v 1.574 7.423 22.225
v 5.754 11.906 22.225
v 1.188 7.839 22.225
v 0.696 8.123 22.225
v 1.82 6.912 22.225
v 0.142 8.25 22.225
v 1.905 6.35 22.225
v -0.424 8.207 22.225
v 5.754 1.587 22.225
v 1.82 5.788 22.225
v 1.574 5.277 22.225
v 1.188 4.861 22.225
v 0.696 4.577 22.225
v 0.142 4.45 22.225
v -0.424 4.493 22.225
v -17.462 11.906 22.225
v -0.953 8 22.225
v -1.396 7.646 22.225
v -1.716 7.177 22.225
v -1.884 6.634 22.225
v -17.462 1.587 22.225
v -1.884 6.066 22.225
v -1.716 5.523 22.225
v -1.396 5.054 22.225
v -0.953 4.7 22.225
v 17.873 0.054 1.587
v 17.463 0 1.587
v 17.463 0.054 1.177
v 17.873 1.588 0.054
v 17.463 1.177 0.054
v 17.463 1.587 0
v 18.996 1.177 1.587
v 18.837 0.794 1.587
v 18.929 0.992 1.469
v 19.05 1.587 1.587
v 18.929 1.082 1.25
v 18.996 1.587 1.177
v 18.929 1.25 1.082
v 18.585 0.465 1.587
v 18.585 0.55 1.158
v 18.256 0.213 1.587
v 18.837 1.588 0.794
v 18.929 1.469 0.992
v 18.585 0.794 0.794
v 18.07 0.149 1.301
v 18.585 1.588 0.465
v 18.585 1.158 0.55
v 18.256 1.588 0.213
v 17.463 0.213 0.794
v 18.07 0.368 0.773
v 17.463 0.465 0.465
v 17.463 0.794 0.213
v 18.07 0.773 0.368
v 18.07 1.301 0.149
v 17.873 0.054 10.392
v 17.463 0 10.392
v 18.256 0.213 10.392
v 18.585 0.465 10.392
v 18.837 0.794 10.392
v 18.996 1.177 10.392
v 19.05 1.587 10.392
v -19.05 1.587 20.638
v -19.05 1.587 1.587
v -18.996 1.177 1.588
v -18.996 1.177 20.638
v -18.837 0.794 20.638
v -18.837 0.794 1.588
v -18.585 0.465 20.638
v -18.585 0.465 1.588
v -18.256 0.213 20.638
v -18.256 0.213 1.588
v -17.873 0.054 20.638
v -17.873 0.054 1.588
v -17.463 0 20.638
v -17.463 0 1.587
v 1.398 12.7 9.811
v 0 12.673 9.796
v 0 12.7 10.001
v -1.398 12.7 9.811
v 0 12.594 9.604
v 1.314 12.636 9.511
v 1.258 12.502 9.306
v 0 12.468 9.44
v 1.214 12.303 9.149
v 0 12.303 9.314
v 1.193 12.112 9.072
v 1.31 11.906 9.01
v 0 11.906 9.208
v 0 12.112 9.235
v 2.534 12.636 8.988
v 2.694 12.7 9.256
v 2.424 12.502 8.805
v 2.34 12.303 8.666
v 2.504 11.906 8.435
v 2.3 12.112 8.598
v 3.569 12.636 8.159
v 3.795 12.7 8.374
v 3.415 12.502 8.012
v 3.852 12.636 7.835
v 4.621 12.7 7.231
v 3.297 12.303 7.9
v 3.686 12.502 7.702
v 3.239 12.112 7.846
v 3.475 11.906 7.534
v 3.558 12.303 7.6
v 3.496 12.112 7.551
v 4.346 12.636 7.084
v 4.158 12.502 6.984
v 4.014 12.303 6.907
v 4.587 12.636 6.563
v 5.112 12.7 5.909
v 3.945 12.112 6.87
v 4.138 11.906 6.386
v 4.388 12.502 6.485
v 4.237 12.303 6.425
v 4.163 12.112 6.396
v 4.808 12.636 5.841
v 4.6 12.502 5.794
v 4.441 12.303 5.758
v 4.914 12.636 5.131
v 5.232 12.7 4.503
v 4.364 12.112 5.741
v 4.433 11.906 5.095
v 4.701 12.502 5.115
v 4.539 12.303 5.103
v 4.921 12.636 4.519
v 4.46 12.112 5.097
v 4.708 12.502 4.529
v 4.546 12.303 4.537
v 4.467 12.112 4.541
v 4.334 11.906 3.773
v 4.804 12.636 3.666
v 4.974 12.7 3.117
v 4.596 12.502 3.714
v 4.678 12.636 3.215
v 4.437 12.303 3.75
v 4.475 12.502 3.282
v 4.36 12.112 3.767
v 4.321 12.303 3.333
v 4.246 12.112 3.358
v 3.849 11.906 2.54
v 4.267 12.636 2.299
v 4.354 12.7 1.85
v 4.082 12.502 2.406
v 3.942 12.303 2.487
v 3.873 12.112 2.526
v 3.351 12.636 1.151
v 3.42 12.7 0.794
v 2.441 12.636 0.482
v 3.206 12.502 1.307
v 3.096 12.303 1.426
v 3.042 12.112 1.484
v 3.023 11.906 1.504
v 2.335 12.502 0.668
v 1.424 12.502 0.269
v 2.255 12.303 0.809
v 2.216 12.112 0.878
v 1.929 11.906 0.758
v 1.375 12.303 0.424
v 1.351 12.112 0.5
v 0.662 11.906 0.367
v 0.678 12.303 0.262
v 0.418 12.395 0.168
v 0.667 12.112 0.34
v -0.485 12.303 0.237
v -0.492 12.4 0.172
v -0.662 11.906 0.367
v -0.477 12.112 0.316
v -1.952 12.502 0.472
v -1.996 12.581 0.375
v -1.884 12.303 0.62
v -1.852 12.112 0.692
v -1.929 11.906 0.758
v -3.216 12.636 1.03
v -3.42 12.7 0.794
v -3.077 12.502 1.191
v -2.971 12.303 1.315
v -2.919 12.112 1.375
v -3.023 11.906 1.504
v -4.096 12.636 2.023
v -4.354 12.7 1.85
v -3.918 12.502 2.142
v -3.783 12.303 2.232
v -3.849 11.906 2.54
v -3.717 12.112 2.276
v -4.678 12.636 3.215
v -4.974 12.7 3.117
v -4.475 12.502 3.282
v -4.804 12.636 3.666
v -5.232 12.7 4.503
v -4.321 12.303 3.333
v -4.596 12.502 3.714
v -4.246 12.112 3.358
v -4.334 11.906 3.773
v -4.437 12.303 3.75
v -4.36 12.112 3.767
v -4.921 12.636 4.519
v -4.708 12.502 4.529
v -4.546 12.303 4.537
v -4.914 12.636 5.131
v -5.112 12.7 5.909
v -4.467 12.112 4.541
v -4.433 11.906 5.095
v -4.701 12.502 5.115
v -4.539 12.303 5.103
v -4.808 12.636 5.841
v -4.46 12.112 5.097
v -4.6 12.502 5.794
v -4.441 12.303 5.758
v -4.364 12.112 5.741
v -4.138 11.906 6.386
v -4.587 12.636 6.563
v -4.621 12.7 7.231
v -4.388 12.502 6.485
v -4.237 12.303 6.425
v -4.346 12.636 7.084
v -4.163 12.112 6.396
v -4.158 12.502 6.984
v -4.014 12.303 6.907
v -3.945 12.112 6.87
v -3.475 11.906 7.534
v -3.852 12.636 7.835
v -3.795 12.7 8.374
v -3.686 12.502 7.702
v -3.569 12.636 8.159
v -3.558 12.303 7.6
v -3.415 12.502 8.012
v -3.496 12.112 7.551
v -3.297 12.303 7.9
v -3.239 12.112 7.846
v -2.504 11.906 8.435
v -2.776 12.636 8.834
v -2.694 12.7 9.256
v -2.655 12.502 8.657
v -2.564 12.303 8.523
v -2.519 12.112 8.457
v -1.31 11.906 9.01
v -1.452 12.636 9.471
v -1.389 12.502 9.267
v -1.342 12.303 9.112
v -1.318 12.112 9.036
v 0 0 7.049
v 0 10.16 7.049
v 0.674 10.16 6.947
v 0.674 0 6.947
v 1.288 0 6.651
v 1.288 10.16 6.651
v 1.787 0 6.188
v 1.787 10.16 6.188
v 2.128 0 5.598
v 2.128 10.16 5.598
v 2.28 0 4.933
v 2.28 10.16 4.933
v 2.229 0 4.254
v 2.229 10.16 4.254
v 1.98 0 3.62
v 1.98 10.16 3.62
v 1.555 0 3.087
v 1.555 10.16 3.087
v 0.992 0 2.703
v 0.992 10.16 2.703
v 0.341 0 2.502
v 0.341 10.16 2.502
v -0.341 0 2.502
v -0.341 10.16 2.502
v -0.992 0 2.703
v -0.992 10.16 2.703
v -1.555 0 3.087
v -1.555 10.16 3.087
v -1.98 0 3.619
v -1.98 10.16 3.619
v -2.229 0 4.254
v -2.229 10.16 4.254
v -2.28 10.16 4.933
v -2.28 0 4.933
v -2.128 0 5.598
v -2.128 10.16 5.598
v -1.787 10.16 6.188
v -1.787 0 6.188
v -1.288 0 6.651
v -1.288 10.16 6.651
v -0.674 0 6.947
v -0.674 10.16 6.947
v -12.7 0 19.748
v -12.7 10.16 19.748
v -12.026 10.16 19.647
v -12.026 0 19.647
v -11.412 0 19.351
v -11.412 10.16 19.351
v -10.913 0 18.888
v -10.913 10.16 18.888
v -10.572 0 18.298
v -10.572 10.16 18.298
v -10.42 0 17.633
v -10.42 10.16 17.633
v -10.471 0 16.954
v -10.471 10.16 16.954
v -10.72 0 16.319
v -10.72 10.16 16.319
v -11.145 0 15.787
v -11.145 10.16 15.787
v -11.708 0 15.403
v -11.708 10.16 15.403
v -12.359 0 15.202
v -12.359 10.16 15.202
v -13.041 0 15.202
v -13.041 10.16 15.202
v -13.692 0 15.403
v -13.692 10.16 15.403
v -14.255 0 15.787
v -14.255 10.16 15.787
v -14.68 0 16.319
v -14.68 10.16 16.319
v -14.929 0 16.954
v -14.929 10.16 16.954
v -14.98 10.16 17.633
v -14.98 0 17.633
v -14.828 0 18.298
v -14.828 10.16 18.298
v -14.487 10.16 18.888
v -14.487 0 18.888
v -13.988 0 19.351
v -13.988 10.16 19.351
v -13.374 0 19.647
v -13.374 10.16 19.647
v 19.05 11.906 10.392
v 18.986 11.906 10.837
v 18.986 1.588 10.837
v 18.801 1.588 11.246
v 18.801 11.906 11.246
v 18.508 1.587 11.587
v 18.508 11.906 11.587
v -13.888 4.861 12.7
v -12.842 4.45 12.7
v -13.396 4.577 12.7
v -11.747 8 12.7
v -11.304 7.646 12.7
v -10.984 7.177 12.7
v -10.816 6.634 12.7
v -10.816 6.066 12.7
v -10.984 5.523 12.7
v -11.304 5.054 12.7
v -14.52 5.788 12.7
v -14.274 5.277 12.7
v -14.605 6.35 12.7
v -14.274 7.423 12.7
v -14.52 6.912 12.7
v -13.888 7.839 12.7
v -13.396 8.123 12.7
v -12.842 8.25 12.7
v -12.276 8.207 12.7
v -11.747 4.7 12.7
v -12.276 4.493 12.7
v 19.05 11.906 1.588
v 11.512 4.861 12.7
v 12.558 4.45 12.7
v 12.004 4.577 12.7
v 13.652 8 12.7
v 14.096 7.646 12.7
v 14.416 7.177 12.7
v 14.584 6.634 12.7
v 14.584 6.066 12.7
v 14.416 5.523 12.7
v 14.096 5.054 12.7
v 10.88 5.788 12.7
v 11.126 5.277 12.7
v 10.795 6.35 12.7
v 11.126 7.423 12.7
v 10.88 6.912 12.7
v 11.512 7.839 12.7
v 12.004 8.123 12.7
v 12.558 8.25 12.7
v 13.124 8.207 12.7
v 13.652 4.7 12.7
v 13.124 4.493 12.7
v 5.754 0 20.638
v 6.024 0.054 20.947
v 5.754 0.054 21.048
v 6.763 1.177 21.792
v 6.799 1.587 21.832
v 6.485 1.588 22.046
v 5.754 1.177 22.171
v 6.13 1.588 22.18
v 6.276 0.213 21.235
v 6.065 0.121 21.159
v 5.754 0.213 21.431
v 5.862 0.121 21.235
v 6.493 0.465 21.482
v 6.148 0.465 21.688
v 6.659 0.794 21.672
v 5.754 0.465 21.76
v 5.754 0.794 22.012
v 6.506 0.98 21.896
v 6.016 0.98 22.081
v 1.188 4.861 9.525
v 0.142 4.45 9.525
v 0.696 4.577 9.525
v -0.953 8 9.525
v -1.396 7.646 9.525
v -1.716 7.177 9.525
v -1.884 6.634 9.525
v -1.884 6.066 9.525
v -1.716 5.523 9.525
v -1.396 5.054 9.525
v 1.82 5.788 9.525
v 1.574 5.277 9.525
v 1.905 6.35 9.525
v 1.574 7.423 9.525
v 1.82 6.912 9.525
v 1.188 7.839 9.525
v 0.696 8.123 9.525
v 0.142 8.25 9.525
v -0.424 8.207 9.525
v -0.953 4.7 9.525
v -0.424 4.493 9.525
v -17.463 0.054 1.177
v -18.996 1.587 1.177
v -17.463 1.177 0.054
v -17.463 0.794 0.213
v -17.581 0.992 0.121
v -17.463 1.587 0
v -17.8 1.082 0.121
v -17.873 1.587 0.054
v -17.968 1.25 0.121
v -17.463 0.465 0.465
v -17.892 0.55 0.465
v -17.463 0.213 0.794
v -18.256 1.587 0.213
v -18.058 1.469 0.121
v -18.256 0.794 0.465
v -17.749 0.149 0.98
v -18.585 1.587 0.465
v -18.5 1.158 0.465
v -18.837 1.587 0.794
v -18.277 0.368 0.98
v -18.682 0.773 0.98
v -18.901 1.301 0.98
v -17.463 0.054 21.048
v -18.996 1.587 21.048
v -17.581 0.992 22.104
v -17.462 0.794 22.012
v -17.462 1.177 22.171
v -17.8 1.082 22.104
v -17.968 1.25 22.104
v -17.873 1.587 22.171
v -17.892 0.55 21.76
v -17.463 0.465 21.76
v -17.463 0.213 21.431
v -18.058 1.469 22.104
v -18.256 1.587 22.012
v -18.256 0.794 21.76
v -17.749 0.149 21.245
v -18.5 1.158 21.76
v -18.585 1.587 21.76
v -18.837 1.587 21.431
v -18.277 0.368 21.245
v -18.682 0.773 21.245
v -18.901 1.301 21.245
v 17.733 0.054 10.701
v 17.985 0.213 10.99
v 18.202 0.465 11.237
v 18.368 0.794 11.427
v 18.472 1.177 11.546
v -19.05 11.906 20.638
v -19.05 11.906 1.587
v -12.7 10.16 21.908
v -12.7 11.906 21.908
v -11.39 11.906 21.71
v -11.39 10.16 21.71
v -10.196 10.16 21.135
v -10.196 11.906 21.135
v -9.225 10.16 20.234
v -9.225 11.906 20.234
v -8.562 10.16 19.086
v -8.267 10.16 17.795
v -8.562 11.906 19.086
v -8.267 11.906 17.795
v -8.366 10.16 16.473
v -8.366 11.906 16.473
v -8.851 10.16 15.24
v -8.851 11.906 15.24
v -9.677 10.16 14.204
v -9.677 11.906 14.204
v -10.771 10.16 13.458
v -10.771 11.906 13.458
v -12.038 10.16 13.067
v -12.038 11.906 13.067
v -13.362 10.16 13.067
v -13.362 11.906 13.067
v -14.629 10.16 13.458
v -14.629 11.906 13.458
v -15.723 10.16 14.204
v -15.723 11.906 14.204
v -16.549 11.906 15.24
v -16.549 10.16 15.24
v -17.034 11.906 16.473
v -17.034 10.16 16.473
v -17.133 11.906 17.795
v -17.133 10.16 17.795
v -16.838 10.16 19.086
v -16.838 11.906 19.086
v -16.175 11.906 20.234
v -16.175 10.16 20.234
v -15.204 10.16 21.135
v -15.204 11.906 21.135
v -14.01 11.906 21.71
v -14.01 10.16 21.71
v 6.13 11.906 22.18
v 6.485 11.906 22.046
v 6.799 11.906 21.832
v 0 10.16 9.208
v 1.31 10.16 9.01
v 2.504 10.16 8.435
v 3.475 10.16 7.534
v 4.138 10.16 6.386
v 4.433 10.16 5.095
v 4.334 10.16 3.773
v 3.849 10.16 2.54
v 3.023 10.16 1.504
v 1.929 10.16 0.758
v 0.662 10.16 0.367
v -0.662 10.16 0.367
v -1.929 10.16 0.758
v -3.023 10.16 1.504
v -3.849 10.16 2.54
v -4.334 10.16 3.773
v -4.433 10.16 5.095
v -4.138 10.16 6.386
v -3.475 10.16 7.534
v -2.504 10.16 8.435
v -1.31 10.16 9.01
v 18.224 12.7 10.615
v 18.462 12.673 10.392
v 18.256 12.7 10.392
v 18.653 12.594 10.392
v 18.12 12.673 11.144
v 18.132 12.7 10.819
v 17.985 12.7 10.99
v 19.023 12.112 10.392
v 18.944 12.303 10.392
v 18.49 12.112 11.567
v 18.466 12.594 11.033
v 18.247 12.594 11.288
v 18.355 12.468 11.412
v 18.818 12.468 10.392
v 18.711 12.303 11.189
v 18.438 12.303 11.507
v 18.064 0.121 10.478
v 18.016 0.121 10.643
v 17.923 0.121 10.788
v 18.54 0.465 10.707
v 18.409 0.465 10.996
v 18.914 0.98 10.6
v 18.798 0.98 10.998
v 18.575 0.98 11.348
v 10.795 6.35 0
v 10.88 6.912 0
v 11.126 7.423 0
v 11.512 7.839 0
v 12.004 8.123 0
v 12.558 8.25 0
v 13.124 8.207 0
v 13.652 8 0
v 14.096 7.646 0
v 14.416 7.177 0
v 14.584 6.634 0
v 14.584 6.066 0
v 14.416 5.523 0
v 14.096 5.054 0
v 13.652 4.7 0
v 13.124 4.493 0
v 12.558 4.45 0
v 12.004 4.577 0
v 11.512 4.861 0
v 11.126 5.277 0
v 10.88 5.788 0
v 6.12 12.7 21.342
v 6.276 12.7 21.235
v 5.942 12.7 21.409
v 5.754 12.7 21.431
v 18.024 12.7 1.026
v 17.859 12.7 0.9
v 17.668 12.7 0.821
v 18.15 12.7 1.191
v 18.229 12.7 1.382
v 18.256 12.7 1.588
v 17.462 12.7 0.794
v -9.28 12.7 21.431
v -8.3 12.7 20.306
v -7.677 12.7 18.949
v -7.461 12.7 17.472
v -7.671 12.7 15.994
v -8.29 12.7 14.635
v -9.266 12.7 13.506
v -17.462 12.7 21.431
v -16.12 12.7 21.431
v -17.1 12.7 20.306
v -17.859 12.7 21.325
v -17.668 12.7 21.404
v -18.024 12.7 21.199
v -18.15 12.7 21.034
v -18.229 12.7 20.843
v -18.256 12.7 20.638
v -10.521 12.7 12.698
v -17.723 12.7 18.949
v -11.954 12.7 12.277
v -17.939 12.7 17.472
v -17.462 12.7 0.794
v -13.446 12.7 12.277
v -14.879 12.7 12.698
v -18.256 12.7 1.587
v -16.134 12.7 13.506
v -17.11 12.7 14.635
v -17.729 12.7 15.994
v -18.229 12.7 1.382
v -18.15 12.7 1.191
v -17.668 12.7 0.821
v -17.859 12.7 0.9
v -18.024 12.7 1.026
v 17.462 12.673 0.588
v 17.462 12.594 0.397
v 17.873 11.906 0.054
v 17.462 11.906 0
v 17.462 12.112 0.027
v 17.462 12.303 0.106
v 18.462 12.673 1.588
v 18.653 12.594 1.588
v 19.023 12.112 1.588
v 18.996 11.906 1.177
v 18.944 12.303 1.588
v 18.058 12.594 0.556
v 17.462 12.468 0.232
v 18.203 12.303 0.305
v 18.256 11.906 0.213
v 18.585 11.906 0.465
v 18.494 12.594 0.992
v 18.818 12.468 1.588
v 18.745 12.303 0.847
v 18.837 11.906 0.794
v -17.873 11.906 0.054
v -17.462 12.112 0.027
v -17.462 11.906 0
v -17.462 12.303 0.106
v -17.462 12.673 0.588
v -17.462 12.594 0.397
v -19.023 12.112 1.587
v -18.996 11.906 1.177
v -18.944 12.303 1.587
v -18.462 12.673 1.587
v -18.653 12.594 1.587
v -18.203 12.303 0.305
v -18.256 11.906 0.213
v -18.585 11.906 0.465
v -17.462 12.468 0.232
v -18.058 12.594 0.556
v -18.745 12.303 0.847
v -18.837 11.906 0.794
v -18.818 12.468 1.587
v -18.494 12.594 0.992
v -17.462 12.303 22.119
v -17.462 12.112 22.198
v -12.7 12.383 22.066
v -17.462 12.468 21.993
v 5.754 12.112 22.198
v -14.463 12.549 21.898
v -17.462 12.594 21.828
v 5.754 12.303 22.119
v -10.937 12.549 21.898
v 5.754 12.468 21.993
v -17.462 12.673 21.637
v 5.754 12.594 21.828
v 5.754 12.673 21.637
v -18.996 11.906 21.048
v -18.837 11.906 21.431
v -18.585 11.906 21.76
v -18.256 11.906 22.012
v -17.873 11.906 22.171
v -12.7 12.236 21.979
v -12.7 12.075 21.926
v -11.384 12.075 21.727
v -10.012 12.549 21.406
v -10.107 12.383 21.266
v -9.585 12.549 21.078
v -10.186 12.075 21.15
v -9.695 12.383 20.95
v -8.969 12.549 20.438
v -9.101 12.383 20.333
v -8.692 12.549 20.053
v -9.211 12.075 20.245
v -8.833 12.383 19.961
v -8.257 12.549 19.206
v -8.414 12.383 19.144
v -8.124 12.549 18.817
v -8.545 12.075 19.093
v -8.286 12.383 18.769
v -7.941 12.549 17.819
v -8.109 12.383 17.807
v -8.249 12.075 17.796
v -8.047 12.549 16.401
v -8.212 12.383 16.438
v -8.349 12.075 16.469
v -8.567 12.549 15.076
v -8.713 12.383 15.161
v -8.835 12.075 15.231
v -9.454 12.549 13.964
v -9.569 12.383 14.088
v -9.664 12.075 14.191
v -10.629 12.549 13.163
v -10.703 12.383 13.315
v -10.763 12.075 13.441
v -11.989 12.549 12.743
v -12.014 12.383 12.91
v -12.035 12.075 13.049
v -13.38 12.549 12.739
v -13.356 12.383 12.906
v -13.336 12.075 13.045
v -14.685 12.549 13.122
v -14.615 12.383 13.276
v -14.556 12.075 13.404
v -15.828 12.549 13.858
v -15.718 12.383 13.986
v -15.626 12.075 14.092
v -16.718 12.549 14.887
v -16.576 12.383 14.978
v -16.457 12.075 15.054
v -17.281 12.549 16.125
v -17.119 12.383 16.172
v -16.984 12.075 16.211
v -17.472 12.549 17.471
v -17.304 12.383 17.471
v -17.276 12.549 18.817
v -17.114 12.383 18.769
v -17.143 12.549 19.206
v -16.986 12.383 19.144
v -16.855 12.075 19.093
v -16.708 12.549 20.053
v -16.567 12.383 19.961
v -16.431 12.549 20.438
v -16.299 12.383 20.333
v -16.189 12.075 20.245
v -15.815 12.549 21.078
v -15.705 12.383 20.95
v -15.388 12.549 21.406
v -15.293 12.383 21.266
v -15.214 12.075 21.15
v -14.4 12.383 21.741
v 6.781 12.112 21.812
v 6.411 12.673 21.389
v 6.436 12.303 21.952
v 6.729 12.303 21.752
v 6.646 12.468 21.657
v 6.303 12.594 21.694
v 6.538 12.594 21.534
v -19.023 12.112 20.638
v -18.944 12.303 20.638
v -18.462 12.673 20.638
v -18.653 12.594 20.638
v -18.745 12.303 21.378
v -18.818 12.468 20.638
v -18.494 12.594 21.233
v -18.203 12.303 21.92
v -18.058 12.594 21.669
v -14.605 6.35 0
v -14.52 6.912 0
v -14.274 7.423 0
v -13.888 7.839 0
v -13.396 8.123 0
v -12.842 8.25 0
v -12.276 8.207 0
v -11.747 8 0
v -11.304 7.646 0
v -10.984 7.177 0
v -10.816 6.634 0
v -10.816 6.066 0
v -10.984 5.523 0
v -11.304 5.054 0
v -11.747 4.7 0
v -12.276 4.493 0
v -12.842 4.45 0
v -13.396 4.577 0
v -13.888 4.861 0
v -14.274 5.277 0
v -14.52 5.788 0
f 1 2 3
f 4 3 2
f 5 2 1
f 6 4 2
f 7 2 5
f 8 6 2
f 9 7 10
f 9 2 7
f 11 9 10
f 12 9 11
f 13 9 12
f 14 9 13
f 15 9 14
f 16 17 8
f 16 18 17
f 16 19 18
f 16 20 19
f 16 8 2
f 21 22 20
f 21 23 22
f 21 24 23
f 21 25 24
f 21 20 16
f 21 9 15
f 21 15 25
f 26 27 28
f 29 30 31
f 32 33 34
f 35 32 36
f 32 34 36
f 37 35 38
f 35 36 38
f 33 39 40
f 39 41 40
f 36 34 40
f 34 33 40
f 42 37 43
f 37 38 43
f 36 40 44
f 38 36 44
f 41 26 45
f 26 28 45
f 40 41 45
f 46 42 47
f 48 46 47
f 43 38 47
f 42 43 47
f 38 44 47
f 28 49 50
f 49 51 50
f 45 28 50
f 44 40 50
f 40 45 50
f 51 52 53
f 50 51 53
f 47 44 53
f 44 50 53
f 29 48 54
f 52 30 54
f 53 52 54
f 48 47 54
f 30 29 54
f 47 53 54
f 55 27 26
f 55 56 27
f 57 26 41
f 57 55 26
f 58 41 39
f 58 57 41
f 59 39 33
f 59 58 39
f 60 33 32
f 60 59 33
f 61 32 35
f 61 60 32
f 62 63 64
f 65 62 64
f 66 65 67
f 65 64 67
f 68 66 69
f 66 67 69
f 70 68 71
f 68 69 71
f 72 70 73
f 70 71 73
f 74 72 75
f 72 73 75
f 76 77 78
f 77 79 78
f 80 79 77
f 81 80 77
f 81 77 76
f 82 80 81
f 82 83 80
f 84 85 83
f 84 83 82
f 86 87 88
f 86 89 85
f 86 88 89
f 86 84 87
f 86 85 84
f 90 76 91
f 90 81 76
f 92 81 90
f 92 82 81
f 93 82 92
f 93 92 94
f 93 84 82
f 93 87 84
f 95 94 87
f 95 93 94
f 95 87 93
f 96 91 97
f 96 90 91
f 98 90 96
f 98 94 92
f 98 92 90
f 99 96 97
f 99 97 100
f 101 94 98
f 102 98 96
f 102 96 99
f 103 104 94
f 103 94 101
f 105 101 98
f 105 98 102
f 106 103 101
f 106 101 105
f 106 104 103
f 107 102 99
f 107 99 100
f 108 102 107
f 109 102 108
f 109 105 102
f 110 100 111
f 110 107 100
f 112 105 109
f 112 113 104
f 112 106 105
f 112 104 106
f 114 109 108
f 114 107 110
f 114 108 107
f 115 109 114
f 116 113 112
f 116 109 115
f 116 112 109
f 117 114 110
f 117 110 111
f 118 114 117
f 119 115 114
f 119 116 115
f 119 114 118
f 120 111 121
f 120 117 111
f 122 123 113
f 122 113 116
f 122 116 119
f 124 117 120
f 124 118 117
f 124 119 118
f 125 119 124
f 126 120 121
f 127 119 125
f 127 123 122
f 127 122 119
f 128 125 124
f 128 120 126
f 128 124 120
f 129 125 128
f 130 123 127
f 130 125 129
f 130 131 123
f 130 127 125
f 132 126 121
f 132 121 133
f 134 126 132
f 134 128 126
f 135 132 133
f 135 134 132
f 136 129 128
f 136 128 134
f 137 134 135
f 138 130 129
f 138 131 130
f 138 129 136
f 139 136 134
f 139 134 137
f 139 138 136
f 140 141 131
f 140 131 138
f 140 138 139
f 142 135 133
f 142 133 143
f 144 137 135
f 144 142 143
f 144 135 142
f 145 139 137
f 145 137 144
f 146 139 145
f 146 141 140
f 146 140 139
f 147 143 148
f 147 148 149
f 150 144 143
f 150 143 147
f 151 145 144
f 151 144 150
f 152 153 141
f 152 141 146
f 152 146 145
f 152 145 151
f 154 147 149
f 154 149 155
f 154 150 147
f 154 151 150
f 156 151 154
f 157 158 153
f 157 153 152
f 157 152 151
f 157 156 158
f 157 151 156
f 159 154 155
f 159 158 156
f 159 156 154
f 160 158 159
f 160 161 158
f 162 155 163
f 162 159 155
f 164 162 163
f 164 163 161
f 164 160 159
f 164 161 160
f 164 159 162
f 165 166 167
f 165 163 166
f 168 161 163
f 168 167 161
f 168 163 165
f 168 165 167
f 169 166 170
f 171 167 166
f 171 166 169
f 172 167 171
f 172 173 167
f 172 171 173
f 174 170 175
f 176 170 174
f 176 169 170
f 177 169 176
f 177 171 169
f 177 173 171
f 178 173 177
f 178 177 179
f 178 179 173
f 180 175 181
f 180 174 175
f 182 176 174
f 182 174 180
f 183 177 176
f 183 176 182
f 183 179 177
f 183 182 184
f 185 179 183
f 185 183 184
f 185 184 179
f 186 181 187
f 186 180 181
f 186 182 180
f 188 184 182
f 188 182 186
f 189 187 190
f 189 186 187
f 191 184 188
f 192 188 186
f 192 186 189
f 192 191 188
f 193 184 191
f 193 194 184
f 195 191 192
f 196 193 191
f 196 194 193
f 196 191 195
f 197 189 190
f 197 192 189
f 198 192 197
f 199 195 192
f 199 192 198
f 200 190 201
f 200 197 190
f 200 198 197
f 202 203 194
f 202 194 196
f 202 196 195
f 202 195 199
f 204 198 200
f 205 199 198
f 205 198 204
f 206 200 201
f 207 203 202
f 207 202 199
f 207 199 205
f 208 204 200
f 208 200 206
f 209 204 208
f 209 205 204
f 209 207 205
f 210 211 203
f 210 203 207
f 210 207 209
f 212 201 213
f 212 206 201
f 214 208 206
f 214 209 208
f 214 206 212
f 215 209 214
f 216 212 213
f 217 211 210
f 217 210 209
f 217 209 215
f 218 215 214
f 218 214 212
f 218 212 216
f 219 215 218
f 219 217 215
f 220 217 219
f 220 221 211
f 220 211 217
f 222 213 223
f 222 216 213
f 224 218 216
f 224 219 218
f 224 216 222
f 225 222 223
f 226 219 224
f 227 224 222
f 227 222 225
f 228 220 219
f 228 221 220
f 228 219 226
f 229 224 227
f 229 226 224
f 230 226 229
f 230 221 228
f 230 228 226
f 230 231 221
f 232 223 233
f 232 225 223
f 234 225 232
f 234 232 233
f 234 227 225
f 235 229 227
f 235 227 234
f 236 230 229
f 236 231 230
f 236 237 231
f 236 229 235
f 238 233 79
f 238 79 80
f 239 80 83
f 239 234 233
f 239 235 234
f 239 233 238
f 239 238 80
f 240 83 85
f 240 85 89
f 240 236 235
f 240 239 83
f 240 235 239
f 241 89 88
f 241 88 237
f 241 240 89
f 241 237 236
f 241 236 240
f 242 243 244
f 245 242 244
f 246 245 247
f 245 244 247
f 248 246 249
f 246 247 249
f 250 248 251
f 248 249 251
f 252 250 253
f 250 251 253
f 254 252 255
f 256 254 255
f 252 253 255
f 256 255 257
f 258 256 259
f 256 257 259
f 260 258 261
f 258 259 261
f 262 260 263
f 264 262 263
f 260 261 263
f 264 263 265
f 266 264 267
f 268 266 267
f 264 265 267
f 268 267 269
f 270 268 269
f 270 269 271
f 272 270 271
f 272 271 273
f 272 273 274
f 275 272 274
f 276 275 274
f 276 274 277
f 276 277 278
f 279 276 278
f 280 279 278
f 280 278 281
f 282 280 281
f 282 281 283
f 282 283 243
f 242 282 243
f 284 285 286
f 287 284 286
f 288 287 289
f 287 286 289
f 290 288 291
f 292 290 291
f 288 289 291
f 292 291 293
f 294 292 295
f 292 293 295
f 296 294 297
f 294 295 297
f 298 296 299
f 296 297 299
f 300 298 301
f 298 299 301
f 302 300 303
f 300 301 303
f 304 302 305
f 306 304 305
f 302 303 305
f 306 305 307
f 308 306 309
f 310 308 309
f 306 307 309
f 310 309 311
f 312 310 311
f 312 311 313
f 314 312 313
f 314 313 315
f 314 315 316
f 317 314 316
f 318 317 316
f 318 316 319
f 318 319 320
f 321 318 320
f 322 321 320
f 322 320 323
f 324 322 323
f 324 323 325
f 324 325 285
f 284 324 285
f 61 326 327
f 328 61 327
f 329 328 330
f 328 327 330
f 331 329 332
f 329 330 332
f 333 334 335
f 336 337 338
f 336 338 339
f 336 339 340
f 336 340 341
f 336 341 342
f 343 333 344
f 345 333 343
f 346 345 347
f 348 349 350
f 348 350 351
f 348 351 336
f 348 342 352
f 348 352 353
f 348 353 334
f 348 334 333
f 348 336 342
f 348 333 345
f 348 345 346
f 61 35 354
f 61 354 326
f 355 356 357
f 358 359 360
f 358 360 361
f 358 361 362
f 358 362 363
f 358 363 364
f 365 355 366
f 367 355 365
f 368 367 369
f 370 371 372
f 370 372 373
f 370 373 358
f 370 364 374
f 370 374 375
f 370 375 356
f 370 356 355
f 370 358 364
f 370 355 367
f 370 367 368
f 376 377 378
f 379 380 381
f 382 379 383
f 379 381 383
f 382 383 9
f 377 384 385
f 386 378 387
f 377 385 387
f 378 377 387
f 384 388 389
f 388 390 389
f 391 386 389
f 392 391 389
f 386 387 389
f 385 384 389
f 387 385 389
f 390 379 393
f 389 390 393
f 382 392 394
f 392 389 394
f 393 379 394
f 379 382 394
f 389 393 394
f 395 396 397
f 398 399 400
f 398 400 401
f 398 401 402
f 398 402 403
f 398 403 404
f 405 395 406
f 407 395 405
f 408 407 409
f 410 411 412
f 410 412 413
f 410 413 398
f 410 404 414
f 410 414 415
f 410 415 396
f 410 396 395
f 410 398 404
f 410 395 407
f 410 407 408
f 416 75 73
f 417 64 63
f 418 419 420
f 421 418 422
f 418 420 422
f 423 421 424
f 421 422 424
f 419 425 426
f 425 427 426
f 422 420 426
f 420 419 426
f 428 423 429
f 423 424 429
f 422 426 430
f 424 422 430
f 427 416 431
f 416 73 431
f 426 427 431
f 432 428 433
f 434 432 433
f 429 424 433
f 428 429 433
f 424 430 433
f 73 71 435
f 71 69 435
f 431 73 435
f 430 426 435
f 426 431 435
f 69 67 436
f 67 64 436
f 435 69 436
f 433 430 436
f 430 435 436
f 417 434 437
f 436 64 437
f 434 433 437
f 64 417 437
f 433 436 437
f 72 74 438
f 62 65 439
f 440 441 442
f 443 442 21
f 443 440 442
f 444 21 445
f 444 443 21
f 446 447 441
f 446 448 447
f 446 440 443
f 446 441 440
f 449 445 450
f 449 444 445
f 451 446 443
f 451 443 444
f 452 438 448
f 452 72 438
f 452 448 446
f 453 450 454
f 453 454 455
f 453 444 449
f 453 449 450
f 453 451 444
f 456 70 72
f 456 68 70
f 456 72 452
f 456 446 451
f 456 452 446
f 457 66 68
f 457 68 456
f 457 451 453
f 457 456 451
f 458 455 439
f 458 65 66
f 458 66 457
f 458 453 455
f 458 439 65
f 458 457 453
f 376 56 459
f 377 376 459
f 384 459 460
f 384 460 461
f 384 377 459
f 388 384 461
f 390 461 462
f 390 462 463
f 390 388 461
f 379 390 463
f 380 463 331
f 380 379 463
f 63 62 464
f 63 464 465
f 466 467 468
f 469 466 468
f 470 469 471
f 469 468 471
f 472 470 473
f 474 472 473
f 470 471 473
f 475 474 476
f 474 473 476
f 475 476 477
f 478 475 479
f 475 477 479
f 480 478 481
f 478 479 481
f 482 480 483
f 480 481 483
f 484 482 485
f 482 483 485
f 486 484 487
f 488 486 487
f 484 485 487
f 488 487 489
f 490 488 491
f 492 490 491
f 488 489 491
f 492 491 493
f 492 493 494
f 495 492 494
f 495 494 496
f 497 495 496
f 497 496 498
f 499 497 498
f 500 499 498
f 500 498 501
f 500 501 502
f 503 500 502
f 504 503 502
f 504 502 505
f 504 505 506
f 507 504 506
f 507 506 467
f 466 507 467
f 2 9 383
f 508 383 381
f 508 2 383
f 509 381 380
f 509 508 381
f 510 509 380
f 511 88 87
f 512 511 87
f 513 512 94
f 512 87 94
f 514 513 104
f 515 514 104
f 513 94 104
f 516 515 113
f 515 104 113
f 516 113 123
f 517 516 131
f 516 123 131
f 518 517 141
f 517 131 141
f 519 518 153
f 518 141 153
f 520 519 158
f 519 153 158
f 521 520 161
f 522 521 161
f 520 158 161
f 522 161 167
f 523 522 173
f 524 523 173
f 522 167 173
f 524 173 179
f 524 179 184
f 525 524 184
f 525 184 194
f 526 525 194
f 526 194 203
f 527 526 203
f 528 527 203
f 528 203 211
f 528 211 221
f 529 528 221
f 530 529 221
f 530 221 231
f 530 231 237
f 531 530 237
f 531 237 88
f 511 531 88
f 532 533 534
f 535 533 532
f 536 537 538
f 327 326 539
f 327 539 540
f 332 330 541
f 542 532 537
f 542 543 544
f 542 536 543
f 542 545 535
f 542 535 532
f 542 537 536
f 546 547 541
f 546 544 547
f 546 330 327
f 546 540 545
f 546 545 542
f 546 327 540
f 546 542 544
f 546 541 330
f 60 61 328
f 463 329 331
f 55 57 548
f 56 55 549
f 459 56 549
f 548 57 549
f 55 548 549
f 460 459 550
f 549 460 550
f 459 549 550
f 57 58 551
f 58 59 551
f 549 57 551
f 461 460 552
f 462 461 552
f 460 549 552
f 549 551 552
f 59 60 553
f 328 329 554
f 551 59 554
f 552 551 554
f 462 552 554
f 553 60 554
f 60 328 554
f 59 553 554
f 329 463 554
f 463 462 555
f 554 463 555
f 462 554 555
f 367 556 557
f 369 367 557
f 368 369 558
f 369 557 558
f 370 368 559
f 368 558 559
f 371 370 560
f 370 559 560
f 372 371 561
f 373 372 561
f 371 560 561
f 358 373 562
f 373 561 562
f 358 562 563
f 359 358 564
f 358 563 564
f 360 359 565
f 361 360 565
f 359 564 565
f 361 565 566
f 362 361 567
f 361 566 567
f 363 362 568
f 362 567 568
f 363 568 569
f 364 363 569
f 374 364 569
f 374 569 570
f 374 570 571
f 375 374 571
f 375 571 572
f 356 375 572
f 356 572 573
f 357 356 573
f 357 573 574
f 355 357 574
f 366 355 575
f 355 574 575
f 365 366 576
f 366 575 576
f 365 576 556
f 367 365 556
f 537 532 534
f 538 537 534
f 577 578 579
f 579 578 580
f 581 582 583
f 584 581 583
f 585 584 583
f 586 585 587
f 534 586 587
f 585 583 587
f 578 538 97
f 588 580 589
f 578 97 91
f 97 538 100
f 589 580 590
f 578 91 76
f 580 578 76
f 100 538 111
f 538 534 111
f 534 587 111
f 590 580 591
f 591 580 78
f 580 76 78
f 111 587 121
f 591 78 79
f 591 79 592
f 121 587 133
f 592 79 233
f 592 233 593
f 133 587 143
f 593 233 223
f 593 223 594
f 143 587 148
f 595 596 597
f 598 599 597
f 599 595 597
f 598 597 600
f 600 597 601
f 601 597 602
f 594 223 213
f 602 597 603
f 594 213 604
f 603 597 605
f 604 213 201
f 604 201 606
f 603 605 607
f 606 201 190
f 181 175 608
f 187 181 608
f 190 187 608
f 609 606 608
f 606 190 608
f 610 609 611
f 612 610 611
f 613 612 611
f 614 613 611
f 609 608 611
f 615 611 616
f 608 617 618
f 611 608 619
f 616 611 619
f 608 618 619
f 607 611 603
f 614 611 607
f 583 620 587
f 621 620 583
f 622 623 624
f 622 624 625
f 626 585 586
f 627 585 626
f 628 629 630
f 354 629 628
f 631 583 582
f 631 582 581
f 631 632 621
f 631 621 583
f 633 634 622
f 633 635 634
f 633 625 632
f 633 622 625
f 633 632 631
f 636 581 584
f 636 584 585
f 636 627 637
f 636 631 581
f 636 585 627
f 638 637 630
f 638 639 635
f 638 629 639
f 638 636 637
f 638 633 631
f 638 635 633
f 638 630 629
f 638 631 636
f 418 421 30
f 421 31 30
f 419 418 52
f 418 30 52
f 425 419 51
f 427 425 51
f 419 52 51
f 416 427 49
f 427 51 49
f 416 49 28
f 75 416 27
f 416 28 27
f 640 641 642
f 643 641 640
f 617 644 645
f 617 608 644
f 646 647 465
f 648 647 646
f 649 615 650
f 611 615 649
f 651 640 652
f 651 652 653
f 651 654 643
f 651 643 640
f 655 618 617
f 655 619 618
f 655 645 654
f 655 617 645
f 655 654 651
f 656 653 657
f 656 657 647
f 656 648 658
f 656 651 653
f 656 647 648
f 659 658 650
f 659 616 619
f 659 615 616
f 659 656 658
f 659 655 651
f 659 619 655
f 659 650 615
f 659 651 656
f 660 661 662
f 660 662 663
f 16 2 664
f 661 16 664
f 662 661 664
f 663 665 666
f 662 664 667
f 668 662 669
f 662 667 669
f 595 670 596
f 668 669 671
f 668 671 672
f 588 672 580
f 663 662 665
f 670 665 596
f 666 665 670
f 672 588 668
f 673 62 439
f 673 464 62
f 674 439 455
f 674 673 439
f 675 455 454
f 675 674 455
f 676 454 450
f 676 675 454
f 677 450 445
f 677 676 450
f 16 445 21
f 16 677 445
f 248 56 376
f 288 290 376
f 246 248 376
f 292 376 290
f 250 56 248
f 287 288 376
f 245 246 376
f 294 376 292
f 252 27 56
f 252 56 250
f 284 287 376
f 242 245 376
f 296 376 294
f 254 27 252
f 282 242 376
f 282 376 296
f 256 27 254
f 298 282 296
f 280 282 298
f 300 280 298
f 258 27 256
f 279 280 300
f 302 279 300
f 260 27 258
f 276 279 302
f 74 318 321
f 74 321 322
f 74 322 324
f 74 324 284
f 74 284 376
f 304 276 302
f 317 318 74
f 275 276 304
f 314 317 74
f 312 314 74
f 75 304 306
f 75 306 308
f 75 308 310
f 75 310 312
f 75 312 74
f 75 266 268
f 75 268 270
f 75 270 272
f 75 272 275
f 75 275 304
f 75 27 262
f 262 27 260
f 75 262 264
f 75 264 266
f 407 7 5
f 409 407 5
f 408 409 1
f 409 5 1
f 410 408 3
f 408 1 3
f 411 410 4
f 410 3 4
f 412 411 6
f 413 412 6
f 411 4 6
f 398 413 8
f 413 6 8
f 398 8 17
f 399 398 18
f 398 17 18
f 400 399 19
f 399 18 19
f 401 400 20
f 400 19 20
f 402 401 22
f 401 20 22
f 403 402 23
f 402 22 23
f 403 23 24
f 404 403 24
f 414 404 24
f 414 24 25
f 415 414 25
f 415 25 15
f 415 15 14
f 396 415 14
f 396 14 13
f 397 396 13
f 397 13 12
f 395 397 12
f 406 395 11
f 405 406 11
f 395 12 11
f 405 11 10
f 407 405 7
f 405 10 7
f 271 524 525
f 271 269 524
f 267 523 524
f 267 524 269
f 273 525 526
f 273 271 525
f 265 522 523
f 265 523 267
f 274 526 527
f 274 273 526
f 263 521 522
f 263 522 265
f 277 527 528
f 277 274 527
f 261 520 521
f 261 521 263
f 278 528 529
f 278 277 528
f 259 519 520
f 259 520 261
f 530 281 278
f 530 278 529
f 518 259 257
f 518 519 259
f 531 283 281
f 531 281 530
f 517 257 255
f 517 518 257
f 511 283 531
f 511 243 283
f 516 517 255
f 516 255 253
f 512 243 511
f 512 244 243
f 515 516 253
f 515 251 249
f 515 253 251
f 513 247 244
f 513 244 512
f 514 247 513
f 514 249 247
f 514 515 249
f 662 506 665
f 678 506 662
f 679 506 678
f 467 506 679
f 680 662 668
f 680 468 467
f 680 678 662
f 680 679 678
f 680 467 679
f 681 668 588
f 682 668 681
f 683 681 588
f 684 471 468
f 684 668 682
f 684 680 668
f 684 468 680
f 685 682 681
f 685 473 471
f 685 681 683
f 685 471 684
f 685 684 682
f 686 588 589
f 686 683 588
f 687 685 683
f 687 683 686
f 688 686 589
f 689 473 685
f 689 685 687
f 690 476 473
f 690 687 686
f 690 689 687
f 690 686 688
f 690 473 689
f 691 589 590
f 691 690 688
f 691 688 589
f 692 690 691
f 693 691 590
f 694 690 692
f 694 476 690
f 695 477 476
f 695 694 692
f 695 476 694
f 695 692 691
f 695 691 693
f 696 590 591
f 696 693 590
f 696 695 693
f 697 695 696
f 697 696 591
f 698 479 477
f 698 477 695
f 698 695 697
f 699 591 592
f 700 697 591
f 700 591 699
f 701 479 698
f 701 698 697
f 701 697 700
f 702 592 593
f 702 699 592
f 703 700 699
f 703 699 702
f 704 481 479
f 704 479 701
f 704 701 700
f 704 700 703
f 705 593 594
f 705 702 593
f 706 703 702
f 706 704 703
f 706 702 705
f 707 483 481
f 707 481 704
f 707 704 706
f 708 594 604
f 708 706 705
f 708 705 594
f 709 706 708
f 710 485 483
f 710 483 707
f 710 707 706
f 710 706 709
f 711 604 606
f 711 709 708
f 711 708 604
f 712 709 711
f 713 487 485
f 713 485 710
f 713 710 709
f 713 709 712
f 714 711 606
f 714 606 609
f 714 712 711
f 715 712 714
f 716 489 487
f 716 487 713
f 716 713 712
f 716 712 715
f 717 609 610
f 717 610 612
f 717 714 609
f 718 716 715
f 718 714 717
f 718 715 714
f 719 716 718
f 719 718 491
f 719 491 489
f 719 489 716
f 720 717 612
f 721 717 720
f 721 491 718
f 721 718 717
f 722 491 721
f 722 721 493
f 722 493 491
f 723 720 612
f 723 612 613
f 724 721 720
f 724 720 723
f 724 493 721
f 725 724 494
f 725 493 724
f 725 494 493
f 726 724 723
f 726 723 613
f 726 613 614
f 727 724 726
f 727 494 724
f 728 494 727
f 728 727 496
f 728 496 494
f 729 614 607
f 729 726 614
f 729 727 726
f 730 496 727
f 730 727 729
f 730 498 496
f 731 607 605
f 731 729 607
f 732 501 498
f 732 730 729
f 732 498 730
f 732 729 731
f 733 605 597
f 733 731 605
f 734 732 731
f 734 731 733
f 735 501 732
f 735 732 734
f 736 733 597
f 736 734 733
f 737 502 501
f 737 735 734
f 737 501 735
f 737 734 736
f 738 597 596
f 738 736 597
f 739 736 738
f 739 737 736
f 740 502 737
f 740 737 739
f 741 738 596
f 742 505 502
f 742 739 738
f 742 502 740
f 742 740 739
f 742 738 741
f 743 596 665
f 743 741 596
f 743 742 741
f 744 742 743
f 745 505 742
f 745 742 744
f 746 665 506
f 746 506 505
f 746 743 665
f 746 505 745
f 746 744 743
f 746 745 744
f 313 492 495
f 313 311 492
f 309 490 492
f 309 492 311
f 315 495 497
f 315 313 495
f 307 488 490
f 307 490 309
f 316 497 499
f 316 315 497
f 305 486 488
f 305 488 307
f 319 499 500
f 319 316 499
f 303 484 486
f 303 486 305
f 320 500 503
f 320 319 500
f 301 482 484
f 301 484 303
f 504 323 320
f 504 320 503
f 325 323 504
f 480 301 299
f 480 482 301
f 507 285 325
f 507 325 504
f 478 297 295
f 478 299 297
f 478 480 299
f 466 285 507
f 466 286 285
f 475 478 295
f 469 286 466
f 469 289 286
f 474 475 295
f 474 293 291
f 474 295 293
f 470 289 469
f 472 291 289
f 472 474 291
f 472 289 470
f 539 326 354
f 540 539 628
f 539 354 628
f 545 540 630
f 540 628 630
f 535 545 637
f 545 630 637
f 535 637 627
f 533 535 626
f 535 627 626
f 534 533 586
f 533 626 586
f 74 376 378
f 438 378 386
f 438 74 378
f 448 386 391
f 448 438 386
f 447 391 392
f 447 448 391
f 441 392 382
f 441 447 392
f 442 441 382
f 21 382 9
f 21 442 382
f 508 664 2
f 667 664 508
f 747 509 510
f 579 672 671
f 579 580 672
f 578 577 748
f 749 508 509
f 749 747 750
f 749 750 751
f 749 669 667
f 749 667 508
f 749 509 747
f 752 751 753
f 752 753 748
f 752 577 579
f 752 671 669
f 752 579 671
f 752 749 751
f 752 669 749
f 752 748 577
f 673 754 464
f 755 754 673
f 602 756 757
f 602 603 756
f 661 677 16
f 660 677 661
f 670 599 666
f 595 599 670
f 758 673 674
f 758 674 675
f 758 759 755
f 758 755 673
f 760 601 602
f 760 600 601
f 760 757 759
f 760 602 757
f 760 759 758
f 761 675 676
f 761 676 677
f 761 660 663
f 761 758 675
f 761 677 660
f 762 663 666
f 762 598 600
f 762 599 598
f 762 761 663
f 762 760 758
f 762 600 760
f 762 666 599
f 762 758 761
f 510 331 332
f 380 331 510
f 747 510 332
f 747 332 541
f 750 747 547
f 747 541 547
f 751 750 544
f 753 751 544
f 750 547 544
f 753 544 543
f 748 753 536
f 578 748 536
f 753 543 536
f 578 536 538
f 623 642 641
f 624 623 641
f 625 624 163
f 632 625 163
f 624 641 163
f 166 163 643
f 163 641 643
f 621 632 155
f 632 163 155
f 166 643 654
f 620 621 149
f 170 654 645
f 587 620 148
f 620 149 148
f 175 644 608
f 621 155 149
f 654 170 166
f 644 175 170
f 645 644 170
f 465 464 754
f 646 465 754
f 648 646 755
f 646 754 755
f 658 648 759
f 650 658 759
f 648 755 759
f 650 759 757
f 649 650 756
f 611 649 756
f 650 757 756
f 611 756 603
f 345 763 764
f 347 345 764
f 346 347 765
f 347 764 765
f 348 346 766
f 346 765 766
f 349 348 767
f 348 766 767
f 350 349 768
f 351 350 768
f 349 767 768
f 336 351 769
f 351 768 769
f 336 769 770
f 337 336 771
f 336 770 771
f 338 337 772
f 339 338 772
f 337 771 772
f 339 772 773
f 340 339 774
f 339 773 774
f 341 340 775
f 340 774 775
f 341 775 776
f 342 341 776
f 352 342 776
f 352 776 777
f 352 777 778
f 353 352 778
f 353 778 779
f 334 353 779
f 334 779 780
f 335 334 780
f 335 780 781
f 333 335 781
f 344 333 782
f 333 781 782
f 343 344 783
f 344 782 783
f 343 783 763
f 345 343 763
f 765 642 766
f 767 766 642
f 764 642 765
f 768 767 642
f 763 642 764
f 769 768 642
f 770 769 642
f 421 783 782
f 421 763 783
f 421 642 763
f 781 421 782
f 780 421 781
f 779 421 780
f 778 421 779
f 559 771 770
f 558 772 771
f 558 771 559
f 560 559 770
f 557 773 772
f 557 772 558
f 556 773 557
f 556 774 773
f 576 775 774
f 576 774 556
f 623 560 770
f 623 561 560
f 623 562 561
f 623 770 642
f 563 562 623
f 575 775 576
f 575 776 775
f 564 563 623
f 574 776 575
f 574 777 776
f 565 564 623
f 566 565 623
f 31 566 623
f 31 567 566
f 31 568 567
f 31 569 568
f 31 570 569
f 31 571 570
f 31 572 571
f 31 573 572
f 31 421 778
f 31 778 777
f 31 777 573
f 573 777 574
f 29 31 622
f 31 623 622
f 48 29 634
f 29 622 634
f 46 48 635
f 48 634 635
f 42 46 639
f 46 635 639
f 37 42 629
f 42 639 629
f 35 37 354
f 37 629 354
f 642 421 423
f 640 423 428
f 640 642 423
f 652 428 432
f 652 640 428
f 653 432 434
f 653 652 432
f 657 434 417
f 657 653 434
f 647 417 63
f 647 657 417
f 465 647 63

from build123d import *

# Parameters (mm, degrees)
BOSS_EXTRUDE1_DEPTH = 12.7
SKETCH2_R           = 2.286
CUT_EXTRUDE1_DEPTH  = 32.908355097
SKETCH3_R           = 4.445
CUT_EXTRUDE2_DEPTH  = 2.54
SKETCH4_R           = 1.905
CUT_EXTRUDE3_DEPTH  = 12.7
SKETCH5_R           = 1.905
CUT_EXTRUDE4_DEPTH  = 12.7
FILLET1_R           = 1.5875
FILLET2_R           = 0.79375


with BuildPart() as part:
    # Sketch1 → Boss-Extrude1 (new body)
    with BuildSketch(Plane(origin=(0, 0, 0), x_dir=(1, 0, 0), z_dir=(0, 1, 0))):
        Polygon((-19.05, 0), (19.05, 0), (19.05, -11.1125), (6.35, -22.225), (-19.05, -22.225), align=None)
    extrude(amount=BOSS_EXTRUDE1_DEPTH)

    # Sketch2 → Cut-Extrude1 (cut, through all)
    with BuildSketch(Plane(origin=(0, 12.7, 0), x_dir=(1, 0, 0), z_dir=(0, 1, 0))):
        with Locations(Location((0, -4.7625, 0), (0, 0, 270))):
            Circle(SKETCH2_R)
        with Locations(Location((-12.7, -17.4625, 0), (0, 0, 270))):
            Circle(SKETCH2_R)
    extrude(amount=-CUT_EXTRUDE1_DEPTH, mode=Mode.SUBTRACT)

    # Sketch3 → Cut-Extrude2 (cut)
    with BuildSketch(Plane(origin=(0, 12.7, 0), x_dir=(1, 0, 0), z_dir=(0, 1, 0))):
        with Locations(Location((0, -4.7625, 0), (0, 0, 270))):
            Circle(SKETCH3_R)
        with Locations(Location((-12.7, -17.4625, 0), (0, 0, 270))):
            Circle(SKETCH3_R)
    extrude(amount=-CUT_EXTRUDE2_DEPTH, mode=Mode.SUBTRACT)

    # Sketch4 → Cut-Extrude3 (cut)
    with BuildSketch(Plane(origin=(0, 0, 0), x_dir=(-1, 0, 0), z_dir=(0, 0, -1))):
        with Locations((-12.7, 6.35)):
            Circle(SKETCH4_R)
        with Locations((12.7, 6.35)):
            Circle(SKETCH4_R)
    extrude(amount=-CUT_EXTRUDE3_DEPTH, mode=Mode.SUBTRACT)

    # Sketch5 → Cut-Extrude4 (cut)
    with BuildSketch(Plane.XY.offset(22.225)):
        with Locations((0, 6.35)):
            Circle(SKETCH5_R)
    extrude(amount=-CUT_EXTRUDE4_DEPTH, mode=Mode.SUBTRACT)

    # Fillet1
    fillet1_edges = [part.edges().sort_by_distance(p)[0] for p in [
        (-19.05, 0, 11.1125),
        (0, 0, 0),
        (19.05, 0, 5.55625),
        (12.7, 0, 16.66875),
        (-6.35, 0, 22.225),
        (-19.05, 6.35, 22.225),
        (-19.05, 6.35, 0),
        (19.05, 6.35, 0),
        (19.05, 6.35, 11.1125),
        (6.35, 6.35, 22.225),
    ]]
    fillet(fillet1_edges, radius=FILLET1_R)

    # Fillet2
    # the kernel refuses this fillet: 0.79375 mm, written as the material it takes off along each edge
    with BuildSketch(Plane(origin=(0, 12.7, 4.7625), x_dir=(0, 0, 1), z_dir=(-1, 0, 0))) as fillet2_piece_1:
        with BuildLine():
            CenterArc((4.445 + FILLET2_R, -FILLET2_R), FILLET2_R, 90, 90)
            Line((4.445, -FILLET2_R), (4.445, 0))
            Line((4.445, 0), (4.445 + FILLET2_R, 0))
        make_face()
    revolve(axis=Axis((0, 12.7, 4.7625), (0, 1, 0)), mode=Mode.SUBTRACT)
    with BuildSketch(Plane(origin=(-12.7, 12.7, 17.4625), x_dir=(0, 0, 1), z_dir=(-1, 0, 0))) as fillet2_piece_2:
        with BuildLine():
            CenterArc((4.445 + FILLET2_R, -FILLET2_R), FILLET2_R, 90, 90)
            Line((4.445, -FILLET2_R), (4.445, 0))
            Line((4.445, 0), (4.445 + FILLET2_R, 0))
        make_face()
    revolve(axis=Axis((-12.7, 12.7, 17.4625), (0, 1, 0)), mode=Mode.SUBTRACT)
    with BuildSketch(Plane(origin=(-17.4625, 12.7, 0), x_dir=(0, -1, 0), z_dir=(1, 0, 0))) as fillet2_piece_3:
        with BuildLine():
            CenterArc((FILLET2_R, -FILLET2_R), FILLET2_R, 90, 90)
            Line((0, -FILLET2_R), (0, 0))
            Line((0, 0), (FILLET2_R, 0))
        make_face()
    extrude(amount=34.925, mode=Mode.SUBTRACT)
    with BuildSketch(Plane(origin=(19.05, 12.7, 1.5875), x_dir=(-1, 0, 0), z_dir=(0, 0, 1))) as fillet2_piece_4:
        with BuildLine():
            CenterArc((FILLET2_R, FILLET2_R), FILLET2_R, 180, 90)
            Line((0, FILLET2_R), (0, 0))
            Line((0, 0), (FILLET2_R, 0))
        make_face()
    extrude(amount=8.80464294, mode=Mode.SUBTRACT)
    with BuildSketch(Plane(origin=(5.753520503, 12.7, 22.225), x_dir=(0, 0, -1), z_dir=(-1, 0, 0))) as fillet2_piece_5:
        with BuildLine():
            CenterArc((FILLET2_R, FILLET2_R), FILLET2_R, 180, 90)
            Line((0, FILLET2_R), (0, 0))
            Line((0, 0), (FILLET2_R, 0))
        make_face()
    extrude(amount=23.216020503, mode=Mode.SUBTRACT)
    with BuildSketch(Plane(origin=(18.507876065, 12.7, 11.586858443), x_dir=(-0.6585046078685184, 0, -0.7525766947068776), z_dir=(-0.7525766947068777, 0, 0.6585046078685184))) as fillet2_piece_6:
        with BuildLine():
            CenterArc((FILLET2_R, FILLET2_R), FILLET2_R, 180, 90)
            Line((0, FILLET2_R), (0, 0))
            Line((0, 0), (FILLET2_R, 0))
        make_face()
    extrude(amount=15.558519921, mode=Mode.SUBTRACT)
    with BuildSketch(Plane(origin=(-19.05, 12.7, 20.6375), x_dir=(1, 0, 0), z_dir=(0, 0, -1))) as fillet2_piece_7:
        with BuildLine():
            CenterArc((FILLET2_R, FILLET2_R), FILLET2_R, 180, 90)
            Line((0, FILLET2_R), (0, 0))
            Line((0, 0), (FILLET2_R, 0))
        make_face()
    extrude(amount=19.05, mode=Mode.SUBTRACT)
    with BuildSketch(Plane(origin=(-17.4625, 12.7, 20.6375), x_dir=(-1, 0, 0), z_dir=(0, 0, -1))) as fillet2_piece_8:
        with BuildLine():
            CenterArc((1.5875 - FILLET2_R, -FILLET2_R), FILLET2_R, 0, 90)
            Line((1.5875, -FILLET2_R), (1.5875, 0))
            Line((1.5875, 0), (1.5875 - FILLET2_R, 0))
        make_face()
    revolve(axis=Axis((-17.4625, 12.7, 20.6375), (0, 1, 0)), revolution_arc=90, mode=Mode.SUBTRACT)
    with BuildSketch(Plane(origin=(-17.4625, 12.7, 1.5875), x_dir=(0, 0, -1), z_dir=(1, 0, 0))) as fillet2_piece_9:
        with BuildLine():
            CenterArc((1.5875 - FILLET2_R, -FILLET2_R), FILLET2_R, 0, 90)
            Line((1.5875, -FILLET2_R), (1.5875, 0))
            Line((1.5875, 0), (1.5875 - FILLET2_R, 0))
        make_face()
    revolve(axis=Axis((-17.4625, 12.7, 1.5875), (0, 1, 0)), revolution_arc=90, mode=Mode.SUBTRACT)
    with BuildSketch(Plane(origin=(5.753520503, 12.7, 20.6375), x_dir=(0, 0, 1), z_dir=(-1, 0, 0))) as fillet2_piece_10:
        with BuildLine():
            CenterArc((1.5875 - FILLET2_R, -FILLET2_R), FILLET2_R, 0, 90)
            Line((1.5875, -FILLET2_R), (1.5875, 0))
            Line((1.5875, 0), (1.5875 - FILLET2_R, 0))
        make_face()
    revolve(axis=Axis((5.753520503, 12.7, 20.6375), (0, 1, 0)), revolution_arc=41.185925166, mode=Mode.SUBTRACT)
    with BuildSketch(Plane(origin=(17.4625, 12.7, 10.39214294), x_dir=(1, 0, 0), z_dir=(0, 0, -1))) as fillet2_piece_11:
        with BuildLine():
            CenterArc((1.5875 - FILLET2_R, FILLET2_R), FILLET2_R, 270, 90)
            Line((1.5875, FILLET2_R), (1.5875, 0))
            Line((1.5875, 0), (1.5875 - FILLET2_R, 0))
        make_face()
    revolve(axis=Axis((17.4625, 12.7, 10.39214294), (0, -1, 0)), revolution_arc=48.814074834, mode=Mode.SUBTRACT)
    with BuildSketch(Plane(origin=(17.4625, 12.7, 1.5875), x_dir=(0, 0, -1), z_dir=(-1, 0, 0))) as fillet2_piece_12:
        with BuildLine():
            CenterArc((1.5875 - FILLET2_R, FILLET2_R), FILLET2_R, 270, 90)
            Line((1.5875, FILLET2_R), (1.5875, 0))
            Line((1.5875, 0), (1.5875 - FILLET2_R, 0))
        make_face()
    revolve(axis=Axis((17.4625, 12.7, 1.5875), (0, -1, 0)), revolution_arc=90, mode=Mode.SUBTRACT)


solid = part.part
